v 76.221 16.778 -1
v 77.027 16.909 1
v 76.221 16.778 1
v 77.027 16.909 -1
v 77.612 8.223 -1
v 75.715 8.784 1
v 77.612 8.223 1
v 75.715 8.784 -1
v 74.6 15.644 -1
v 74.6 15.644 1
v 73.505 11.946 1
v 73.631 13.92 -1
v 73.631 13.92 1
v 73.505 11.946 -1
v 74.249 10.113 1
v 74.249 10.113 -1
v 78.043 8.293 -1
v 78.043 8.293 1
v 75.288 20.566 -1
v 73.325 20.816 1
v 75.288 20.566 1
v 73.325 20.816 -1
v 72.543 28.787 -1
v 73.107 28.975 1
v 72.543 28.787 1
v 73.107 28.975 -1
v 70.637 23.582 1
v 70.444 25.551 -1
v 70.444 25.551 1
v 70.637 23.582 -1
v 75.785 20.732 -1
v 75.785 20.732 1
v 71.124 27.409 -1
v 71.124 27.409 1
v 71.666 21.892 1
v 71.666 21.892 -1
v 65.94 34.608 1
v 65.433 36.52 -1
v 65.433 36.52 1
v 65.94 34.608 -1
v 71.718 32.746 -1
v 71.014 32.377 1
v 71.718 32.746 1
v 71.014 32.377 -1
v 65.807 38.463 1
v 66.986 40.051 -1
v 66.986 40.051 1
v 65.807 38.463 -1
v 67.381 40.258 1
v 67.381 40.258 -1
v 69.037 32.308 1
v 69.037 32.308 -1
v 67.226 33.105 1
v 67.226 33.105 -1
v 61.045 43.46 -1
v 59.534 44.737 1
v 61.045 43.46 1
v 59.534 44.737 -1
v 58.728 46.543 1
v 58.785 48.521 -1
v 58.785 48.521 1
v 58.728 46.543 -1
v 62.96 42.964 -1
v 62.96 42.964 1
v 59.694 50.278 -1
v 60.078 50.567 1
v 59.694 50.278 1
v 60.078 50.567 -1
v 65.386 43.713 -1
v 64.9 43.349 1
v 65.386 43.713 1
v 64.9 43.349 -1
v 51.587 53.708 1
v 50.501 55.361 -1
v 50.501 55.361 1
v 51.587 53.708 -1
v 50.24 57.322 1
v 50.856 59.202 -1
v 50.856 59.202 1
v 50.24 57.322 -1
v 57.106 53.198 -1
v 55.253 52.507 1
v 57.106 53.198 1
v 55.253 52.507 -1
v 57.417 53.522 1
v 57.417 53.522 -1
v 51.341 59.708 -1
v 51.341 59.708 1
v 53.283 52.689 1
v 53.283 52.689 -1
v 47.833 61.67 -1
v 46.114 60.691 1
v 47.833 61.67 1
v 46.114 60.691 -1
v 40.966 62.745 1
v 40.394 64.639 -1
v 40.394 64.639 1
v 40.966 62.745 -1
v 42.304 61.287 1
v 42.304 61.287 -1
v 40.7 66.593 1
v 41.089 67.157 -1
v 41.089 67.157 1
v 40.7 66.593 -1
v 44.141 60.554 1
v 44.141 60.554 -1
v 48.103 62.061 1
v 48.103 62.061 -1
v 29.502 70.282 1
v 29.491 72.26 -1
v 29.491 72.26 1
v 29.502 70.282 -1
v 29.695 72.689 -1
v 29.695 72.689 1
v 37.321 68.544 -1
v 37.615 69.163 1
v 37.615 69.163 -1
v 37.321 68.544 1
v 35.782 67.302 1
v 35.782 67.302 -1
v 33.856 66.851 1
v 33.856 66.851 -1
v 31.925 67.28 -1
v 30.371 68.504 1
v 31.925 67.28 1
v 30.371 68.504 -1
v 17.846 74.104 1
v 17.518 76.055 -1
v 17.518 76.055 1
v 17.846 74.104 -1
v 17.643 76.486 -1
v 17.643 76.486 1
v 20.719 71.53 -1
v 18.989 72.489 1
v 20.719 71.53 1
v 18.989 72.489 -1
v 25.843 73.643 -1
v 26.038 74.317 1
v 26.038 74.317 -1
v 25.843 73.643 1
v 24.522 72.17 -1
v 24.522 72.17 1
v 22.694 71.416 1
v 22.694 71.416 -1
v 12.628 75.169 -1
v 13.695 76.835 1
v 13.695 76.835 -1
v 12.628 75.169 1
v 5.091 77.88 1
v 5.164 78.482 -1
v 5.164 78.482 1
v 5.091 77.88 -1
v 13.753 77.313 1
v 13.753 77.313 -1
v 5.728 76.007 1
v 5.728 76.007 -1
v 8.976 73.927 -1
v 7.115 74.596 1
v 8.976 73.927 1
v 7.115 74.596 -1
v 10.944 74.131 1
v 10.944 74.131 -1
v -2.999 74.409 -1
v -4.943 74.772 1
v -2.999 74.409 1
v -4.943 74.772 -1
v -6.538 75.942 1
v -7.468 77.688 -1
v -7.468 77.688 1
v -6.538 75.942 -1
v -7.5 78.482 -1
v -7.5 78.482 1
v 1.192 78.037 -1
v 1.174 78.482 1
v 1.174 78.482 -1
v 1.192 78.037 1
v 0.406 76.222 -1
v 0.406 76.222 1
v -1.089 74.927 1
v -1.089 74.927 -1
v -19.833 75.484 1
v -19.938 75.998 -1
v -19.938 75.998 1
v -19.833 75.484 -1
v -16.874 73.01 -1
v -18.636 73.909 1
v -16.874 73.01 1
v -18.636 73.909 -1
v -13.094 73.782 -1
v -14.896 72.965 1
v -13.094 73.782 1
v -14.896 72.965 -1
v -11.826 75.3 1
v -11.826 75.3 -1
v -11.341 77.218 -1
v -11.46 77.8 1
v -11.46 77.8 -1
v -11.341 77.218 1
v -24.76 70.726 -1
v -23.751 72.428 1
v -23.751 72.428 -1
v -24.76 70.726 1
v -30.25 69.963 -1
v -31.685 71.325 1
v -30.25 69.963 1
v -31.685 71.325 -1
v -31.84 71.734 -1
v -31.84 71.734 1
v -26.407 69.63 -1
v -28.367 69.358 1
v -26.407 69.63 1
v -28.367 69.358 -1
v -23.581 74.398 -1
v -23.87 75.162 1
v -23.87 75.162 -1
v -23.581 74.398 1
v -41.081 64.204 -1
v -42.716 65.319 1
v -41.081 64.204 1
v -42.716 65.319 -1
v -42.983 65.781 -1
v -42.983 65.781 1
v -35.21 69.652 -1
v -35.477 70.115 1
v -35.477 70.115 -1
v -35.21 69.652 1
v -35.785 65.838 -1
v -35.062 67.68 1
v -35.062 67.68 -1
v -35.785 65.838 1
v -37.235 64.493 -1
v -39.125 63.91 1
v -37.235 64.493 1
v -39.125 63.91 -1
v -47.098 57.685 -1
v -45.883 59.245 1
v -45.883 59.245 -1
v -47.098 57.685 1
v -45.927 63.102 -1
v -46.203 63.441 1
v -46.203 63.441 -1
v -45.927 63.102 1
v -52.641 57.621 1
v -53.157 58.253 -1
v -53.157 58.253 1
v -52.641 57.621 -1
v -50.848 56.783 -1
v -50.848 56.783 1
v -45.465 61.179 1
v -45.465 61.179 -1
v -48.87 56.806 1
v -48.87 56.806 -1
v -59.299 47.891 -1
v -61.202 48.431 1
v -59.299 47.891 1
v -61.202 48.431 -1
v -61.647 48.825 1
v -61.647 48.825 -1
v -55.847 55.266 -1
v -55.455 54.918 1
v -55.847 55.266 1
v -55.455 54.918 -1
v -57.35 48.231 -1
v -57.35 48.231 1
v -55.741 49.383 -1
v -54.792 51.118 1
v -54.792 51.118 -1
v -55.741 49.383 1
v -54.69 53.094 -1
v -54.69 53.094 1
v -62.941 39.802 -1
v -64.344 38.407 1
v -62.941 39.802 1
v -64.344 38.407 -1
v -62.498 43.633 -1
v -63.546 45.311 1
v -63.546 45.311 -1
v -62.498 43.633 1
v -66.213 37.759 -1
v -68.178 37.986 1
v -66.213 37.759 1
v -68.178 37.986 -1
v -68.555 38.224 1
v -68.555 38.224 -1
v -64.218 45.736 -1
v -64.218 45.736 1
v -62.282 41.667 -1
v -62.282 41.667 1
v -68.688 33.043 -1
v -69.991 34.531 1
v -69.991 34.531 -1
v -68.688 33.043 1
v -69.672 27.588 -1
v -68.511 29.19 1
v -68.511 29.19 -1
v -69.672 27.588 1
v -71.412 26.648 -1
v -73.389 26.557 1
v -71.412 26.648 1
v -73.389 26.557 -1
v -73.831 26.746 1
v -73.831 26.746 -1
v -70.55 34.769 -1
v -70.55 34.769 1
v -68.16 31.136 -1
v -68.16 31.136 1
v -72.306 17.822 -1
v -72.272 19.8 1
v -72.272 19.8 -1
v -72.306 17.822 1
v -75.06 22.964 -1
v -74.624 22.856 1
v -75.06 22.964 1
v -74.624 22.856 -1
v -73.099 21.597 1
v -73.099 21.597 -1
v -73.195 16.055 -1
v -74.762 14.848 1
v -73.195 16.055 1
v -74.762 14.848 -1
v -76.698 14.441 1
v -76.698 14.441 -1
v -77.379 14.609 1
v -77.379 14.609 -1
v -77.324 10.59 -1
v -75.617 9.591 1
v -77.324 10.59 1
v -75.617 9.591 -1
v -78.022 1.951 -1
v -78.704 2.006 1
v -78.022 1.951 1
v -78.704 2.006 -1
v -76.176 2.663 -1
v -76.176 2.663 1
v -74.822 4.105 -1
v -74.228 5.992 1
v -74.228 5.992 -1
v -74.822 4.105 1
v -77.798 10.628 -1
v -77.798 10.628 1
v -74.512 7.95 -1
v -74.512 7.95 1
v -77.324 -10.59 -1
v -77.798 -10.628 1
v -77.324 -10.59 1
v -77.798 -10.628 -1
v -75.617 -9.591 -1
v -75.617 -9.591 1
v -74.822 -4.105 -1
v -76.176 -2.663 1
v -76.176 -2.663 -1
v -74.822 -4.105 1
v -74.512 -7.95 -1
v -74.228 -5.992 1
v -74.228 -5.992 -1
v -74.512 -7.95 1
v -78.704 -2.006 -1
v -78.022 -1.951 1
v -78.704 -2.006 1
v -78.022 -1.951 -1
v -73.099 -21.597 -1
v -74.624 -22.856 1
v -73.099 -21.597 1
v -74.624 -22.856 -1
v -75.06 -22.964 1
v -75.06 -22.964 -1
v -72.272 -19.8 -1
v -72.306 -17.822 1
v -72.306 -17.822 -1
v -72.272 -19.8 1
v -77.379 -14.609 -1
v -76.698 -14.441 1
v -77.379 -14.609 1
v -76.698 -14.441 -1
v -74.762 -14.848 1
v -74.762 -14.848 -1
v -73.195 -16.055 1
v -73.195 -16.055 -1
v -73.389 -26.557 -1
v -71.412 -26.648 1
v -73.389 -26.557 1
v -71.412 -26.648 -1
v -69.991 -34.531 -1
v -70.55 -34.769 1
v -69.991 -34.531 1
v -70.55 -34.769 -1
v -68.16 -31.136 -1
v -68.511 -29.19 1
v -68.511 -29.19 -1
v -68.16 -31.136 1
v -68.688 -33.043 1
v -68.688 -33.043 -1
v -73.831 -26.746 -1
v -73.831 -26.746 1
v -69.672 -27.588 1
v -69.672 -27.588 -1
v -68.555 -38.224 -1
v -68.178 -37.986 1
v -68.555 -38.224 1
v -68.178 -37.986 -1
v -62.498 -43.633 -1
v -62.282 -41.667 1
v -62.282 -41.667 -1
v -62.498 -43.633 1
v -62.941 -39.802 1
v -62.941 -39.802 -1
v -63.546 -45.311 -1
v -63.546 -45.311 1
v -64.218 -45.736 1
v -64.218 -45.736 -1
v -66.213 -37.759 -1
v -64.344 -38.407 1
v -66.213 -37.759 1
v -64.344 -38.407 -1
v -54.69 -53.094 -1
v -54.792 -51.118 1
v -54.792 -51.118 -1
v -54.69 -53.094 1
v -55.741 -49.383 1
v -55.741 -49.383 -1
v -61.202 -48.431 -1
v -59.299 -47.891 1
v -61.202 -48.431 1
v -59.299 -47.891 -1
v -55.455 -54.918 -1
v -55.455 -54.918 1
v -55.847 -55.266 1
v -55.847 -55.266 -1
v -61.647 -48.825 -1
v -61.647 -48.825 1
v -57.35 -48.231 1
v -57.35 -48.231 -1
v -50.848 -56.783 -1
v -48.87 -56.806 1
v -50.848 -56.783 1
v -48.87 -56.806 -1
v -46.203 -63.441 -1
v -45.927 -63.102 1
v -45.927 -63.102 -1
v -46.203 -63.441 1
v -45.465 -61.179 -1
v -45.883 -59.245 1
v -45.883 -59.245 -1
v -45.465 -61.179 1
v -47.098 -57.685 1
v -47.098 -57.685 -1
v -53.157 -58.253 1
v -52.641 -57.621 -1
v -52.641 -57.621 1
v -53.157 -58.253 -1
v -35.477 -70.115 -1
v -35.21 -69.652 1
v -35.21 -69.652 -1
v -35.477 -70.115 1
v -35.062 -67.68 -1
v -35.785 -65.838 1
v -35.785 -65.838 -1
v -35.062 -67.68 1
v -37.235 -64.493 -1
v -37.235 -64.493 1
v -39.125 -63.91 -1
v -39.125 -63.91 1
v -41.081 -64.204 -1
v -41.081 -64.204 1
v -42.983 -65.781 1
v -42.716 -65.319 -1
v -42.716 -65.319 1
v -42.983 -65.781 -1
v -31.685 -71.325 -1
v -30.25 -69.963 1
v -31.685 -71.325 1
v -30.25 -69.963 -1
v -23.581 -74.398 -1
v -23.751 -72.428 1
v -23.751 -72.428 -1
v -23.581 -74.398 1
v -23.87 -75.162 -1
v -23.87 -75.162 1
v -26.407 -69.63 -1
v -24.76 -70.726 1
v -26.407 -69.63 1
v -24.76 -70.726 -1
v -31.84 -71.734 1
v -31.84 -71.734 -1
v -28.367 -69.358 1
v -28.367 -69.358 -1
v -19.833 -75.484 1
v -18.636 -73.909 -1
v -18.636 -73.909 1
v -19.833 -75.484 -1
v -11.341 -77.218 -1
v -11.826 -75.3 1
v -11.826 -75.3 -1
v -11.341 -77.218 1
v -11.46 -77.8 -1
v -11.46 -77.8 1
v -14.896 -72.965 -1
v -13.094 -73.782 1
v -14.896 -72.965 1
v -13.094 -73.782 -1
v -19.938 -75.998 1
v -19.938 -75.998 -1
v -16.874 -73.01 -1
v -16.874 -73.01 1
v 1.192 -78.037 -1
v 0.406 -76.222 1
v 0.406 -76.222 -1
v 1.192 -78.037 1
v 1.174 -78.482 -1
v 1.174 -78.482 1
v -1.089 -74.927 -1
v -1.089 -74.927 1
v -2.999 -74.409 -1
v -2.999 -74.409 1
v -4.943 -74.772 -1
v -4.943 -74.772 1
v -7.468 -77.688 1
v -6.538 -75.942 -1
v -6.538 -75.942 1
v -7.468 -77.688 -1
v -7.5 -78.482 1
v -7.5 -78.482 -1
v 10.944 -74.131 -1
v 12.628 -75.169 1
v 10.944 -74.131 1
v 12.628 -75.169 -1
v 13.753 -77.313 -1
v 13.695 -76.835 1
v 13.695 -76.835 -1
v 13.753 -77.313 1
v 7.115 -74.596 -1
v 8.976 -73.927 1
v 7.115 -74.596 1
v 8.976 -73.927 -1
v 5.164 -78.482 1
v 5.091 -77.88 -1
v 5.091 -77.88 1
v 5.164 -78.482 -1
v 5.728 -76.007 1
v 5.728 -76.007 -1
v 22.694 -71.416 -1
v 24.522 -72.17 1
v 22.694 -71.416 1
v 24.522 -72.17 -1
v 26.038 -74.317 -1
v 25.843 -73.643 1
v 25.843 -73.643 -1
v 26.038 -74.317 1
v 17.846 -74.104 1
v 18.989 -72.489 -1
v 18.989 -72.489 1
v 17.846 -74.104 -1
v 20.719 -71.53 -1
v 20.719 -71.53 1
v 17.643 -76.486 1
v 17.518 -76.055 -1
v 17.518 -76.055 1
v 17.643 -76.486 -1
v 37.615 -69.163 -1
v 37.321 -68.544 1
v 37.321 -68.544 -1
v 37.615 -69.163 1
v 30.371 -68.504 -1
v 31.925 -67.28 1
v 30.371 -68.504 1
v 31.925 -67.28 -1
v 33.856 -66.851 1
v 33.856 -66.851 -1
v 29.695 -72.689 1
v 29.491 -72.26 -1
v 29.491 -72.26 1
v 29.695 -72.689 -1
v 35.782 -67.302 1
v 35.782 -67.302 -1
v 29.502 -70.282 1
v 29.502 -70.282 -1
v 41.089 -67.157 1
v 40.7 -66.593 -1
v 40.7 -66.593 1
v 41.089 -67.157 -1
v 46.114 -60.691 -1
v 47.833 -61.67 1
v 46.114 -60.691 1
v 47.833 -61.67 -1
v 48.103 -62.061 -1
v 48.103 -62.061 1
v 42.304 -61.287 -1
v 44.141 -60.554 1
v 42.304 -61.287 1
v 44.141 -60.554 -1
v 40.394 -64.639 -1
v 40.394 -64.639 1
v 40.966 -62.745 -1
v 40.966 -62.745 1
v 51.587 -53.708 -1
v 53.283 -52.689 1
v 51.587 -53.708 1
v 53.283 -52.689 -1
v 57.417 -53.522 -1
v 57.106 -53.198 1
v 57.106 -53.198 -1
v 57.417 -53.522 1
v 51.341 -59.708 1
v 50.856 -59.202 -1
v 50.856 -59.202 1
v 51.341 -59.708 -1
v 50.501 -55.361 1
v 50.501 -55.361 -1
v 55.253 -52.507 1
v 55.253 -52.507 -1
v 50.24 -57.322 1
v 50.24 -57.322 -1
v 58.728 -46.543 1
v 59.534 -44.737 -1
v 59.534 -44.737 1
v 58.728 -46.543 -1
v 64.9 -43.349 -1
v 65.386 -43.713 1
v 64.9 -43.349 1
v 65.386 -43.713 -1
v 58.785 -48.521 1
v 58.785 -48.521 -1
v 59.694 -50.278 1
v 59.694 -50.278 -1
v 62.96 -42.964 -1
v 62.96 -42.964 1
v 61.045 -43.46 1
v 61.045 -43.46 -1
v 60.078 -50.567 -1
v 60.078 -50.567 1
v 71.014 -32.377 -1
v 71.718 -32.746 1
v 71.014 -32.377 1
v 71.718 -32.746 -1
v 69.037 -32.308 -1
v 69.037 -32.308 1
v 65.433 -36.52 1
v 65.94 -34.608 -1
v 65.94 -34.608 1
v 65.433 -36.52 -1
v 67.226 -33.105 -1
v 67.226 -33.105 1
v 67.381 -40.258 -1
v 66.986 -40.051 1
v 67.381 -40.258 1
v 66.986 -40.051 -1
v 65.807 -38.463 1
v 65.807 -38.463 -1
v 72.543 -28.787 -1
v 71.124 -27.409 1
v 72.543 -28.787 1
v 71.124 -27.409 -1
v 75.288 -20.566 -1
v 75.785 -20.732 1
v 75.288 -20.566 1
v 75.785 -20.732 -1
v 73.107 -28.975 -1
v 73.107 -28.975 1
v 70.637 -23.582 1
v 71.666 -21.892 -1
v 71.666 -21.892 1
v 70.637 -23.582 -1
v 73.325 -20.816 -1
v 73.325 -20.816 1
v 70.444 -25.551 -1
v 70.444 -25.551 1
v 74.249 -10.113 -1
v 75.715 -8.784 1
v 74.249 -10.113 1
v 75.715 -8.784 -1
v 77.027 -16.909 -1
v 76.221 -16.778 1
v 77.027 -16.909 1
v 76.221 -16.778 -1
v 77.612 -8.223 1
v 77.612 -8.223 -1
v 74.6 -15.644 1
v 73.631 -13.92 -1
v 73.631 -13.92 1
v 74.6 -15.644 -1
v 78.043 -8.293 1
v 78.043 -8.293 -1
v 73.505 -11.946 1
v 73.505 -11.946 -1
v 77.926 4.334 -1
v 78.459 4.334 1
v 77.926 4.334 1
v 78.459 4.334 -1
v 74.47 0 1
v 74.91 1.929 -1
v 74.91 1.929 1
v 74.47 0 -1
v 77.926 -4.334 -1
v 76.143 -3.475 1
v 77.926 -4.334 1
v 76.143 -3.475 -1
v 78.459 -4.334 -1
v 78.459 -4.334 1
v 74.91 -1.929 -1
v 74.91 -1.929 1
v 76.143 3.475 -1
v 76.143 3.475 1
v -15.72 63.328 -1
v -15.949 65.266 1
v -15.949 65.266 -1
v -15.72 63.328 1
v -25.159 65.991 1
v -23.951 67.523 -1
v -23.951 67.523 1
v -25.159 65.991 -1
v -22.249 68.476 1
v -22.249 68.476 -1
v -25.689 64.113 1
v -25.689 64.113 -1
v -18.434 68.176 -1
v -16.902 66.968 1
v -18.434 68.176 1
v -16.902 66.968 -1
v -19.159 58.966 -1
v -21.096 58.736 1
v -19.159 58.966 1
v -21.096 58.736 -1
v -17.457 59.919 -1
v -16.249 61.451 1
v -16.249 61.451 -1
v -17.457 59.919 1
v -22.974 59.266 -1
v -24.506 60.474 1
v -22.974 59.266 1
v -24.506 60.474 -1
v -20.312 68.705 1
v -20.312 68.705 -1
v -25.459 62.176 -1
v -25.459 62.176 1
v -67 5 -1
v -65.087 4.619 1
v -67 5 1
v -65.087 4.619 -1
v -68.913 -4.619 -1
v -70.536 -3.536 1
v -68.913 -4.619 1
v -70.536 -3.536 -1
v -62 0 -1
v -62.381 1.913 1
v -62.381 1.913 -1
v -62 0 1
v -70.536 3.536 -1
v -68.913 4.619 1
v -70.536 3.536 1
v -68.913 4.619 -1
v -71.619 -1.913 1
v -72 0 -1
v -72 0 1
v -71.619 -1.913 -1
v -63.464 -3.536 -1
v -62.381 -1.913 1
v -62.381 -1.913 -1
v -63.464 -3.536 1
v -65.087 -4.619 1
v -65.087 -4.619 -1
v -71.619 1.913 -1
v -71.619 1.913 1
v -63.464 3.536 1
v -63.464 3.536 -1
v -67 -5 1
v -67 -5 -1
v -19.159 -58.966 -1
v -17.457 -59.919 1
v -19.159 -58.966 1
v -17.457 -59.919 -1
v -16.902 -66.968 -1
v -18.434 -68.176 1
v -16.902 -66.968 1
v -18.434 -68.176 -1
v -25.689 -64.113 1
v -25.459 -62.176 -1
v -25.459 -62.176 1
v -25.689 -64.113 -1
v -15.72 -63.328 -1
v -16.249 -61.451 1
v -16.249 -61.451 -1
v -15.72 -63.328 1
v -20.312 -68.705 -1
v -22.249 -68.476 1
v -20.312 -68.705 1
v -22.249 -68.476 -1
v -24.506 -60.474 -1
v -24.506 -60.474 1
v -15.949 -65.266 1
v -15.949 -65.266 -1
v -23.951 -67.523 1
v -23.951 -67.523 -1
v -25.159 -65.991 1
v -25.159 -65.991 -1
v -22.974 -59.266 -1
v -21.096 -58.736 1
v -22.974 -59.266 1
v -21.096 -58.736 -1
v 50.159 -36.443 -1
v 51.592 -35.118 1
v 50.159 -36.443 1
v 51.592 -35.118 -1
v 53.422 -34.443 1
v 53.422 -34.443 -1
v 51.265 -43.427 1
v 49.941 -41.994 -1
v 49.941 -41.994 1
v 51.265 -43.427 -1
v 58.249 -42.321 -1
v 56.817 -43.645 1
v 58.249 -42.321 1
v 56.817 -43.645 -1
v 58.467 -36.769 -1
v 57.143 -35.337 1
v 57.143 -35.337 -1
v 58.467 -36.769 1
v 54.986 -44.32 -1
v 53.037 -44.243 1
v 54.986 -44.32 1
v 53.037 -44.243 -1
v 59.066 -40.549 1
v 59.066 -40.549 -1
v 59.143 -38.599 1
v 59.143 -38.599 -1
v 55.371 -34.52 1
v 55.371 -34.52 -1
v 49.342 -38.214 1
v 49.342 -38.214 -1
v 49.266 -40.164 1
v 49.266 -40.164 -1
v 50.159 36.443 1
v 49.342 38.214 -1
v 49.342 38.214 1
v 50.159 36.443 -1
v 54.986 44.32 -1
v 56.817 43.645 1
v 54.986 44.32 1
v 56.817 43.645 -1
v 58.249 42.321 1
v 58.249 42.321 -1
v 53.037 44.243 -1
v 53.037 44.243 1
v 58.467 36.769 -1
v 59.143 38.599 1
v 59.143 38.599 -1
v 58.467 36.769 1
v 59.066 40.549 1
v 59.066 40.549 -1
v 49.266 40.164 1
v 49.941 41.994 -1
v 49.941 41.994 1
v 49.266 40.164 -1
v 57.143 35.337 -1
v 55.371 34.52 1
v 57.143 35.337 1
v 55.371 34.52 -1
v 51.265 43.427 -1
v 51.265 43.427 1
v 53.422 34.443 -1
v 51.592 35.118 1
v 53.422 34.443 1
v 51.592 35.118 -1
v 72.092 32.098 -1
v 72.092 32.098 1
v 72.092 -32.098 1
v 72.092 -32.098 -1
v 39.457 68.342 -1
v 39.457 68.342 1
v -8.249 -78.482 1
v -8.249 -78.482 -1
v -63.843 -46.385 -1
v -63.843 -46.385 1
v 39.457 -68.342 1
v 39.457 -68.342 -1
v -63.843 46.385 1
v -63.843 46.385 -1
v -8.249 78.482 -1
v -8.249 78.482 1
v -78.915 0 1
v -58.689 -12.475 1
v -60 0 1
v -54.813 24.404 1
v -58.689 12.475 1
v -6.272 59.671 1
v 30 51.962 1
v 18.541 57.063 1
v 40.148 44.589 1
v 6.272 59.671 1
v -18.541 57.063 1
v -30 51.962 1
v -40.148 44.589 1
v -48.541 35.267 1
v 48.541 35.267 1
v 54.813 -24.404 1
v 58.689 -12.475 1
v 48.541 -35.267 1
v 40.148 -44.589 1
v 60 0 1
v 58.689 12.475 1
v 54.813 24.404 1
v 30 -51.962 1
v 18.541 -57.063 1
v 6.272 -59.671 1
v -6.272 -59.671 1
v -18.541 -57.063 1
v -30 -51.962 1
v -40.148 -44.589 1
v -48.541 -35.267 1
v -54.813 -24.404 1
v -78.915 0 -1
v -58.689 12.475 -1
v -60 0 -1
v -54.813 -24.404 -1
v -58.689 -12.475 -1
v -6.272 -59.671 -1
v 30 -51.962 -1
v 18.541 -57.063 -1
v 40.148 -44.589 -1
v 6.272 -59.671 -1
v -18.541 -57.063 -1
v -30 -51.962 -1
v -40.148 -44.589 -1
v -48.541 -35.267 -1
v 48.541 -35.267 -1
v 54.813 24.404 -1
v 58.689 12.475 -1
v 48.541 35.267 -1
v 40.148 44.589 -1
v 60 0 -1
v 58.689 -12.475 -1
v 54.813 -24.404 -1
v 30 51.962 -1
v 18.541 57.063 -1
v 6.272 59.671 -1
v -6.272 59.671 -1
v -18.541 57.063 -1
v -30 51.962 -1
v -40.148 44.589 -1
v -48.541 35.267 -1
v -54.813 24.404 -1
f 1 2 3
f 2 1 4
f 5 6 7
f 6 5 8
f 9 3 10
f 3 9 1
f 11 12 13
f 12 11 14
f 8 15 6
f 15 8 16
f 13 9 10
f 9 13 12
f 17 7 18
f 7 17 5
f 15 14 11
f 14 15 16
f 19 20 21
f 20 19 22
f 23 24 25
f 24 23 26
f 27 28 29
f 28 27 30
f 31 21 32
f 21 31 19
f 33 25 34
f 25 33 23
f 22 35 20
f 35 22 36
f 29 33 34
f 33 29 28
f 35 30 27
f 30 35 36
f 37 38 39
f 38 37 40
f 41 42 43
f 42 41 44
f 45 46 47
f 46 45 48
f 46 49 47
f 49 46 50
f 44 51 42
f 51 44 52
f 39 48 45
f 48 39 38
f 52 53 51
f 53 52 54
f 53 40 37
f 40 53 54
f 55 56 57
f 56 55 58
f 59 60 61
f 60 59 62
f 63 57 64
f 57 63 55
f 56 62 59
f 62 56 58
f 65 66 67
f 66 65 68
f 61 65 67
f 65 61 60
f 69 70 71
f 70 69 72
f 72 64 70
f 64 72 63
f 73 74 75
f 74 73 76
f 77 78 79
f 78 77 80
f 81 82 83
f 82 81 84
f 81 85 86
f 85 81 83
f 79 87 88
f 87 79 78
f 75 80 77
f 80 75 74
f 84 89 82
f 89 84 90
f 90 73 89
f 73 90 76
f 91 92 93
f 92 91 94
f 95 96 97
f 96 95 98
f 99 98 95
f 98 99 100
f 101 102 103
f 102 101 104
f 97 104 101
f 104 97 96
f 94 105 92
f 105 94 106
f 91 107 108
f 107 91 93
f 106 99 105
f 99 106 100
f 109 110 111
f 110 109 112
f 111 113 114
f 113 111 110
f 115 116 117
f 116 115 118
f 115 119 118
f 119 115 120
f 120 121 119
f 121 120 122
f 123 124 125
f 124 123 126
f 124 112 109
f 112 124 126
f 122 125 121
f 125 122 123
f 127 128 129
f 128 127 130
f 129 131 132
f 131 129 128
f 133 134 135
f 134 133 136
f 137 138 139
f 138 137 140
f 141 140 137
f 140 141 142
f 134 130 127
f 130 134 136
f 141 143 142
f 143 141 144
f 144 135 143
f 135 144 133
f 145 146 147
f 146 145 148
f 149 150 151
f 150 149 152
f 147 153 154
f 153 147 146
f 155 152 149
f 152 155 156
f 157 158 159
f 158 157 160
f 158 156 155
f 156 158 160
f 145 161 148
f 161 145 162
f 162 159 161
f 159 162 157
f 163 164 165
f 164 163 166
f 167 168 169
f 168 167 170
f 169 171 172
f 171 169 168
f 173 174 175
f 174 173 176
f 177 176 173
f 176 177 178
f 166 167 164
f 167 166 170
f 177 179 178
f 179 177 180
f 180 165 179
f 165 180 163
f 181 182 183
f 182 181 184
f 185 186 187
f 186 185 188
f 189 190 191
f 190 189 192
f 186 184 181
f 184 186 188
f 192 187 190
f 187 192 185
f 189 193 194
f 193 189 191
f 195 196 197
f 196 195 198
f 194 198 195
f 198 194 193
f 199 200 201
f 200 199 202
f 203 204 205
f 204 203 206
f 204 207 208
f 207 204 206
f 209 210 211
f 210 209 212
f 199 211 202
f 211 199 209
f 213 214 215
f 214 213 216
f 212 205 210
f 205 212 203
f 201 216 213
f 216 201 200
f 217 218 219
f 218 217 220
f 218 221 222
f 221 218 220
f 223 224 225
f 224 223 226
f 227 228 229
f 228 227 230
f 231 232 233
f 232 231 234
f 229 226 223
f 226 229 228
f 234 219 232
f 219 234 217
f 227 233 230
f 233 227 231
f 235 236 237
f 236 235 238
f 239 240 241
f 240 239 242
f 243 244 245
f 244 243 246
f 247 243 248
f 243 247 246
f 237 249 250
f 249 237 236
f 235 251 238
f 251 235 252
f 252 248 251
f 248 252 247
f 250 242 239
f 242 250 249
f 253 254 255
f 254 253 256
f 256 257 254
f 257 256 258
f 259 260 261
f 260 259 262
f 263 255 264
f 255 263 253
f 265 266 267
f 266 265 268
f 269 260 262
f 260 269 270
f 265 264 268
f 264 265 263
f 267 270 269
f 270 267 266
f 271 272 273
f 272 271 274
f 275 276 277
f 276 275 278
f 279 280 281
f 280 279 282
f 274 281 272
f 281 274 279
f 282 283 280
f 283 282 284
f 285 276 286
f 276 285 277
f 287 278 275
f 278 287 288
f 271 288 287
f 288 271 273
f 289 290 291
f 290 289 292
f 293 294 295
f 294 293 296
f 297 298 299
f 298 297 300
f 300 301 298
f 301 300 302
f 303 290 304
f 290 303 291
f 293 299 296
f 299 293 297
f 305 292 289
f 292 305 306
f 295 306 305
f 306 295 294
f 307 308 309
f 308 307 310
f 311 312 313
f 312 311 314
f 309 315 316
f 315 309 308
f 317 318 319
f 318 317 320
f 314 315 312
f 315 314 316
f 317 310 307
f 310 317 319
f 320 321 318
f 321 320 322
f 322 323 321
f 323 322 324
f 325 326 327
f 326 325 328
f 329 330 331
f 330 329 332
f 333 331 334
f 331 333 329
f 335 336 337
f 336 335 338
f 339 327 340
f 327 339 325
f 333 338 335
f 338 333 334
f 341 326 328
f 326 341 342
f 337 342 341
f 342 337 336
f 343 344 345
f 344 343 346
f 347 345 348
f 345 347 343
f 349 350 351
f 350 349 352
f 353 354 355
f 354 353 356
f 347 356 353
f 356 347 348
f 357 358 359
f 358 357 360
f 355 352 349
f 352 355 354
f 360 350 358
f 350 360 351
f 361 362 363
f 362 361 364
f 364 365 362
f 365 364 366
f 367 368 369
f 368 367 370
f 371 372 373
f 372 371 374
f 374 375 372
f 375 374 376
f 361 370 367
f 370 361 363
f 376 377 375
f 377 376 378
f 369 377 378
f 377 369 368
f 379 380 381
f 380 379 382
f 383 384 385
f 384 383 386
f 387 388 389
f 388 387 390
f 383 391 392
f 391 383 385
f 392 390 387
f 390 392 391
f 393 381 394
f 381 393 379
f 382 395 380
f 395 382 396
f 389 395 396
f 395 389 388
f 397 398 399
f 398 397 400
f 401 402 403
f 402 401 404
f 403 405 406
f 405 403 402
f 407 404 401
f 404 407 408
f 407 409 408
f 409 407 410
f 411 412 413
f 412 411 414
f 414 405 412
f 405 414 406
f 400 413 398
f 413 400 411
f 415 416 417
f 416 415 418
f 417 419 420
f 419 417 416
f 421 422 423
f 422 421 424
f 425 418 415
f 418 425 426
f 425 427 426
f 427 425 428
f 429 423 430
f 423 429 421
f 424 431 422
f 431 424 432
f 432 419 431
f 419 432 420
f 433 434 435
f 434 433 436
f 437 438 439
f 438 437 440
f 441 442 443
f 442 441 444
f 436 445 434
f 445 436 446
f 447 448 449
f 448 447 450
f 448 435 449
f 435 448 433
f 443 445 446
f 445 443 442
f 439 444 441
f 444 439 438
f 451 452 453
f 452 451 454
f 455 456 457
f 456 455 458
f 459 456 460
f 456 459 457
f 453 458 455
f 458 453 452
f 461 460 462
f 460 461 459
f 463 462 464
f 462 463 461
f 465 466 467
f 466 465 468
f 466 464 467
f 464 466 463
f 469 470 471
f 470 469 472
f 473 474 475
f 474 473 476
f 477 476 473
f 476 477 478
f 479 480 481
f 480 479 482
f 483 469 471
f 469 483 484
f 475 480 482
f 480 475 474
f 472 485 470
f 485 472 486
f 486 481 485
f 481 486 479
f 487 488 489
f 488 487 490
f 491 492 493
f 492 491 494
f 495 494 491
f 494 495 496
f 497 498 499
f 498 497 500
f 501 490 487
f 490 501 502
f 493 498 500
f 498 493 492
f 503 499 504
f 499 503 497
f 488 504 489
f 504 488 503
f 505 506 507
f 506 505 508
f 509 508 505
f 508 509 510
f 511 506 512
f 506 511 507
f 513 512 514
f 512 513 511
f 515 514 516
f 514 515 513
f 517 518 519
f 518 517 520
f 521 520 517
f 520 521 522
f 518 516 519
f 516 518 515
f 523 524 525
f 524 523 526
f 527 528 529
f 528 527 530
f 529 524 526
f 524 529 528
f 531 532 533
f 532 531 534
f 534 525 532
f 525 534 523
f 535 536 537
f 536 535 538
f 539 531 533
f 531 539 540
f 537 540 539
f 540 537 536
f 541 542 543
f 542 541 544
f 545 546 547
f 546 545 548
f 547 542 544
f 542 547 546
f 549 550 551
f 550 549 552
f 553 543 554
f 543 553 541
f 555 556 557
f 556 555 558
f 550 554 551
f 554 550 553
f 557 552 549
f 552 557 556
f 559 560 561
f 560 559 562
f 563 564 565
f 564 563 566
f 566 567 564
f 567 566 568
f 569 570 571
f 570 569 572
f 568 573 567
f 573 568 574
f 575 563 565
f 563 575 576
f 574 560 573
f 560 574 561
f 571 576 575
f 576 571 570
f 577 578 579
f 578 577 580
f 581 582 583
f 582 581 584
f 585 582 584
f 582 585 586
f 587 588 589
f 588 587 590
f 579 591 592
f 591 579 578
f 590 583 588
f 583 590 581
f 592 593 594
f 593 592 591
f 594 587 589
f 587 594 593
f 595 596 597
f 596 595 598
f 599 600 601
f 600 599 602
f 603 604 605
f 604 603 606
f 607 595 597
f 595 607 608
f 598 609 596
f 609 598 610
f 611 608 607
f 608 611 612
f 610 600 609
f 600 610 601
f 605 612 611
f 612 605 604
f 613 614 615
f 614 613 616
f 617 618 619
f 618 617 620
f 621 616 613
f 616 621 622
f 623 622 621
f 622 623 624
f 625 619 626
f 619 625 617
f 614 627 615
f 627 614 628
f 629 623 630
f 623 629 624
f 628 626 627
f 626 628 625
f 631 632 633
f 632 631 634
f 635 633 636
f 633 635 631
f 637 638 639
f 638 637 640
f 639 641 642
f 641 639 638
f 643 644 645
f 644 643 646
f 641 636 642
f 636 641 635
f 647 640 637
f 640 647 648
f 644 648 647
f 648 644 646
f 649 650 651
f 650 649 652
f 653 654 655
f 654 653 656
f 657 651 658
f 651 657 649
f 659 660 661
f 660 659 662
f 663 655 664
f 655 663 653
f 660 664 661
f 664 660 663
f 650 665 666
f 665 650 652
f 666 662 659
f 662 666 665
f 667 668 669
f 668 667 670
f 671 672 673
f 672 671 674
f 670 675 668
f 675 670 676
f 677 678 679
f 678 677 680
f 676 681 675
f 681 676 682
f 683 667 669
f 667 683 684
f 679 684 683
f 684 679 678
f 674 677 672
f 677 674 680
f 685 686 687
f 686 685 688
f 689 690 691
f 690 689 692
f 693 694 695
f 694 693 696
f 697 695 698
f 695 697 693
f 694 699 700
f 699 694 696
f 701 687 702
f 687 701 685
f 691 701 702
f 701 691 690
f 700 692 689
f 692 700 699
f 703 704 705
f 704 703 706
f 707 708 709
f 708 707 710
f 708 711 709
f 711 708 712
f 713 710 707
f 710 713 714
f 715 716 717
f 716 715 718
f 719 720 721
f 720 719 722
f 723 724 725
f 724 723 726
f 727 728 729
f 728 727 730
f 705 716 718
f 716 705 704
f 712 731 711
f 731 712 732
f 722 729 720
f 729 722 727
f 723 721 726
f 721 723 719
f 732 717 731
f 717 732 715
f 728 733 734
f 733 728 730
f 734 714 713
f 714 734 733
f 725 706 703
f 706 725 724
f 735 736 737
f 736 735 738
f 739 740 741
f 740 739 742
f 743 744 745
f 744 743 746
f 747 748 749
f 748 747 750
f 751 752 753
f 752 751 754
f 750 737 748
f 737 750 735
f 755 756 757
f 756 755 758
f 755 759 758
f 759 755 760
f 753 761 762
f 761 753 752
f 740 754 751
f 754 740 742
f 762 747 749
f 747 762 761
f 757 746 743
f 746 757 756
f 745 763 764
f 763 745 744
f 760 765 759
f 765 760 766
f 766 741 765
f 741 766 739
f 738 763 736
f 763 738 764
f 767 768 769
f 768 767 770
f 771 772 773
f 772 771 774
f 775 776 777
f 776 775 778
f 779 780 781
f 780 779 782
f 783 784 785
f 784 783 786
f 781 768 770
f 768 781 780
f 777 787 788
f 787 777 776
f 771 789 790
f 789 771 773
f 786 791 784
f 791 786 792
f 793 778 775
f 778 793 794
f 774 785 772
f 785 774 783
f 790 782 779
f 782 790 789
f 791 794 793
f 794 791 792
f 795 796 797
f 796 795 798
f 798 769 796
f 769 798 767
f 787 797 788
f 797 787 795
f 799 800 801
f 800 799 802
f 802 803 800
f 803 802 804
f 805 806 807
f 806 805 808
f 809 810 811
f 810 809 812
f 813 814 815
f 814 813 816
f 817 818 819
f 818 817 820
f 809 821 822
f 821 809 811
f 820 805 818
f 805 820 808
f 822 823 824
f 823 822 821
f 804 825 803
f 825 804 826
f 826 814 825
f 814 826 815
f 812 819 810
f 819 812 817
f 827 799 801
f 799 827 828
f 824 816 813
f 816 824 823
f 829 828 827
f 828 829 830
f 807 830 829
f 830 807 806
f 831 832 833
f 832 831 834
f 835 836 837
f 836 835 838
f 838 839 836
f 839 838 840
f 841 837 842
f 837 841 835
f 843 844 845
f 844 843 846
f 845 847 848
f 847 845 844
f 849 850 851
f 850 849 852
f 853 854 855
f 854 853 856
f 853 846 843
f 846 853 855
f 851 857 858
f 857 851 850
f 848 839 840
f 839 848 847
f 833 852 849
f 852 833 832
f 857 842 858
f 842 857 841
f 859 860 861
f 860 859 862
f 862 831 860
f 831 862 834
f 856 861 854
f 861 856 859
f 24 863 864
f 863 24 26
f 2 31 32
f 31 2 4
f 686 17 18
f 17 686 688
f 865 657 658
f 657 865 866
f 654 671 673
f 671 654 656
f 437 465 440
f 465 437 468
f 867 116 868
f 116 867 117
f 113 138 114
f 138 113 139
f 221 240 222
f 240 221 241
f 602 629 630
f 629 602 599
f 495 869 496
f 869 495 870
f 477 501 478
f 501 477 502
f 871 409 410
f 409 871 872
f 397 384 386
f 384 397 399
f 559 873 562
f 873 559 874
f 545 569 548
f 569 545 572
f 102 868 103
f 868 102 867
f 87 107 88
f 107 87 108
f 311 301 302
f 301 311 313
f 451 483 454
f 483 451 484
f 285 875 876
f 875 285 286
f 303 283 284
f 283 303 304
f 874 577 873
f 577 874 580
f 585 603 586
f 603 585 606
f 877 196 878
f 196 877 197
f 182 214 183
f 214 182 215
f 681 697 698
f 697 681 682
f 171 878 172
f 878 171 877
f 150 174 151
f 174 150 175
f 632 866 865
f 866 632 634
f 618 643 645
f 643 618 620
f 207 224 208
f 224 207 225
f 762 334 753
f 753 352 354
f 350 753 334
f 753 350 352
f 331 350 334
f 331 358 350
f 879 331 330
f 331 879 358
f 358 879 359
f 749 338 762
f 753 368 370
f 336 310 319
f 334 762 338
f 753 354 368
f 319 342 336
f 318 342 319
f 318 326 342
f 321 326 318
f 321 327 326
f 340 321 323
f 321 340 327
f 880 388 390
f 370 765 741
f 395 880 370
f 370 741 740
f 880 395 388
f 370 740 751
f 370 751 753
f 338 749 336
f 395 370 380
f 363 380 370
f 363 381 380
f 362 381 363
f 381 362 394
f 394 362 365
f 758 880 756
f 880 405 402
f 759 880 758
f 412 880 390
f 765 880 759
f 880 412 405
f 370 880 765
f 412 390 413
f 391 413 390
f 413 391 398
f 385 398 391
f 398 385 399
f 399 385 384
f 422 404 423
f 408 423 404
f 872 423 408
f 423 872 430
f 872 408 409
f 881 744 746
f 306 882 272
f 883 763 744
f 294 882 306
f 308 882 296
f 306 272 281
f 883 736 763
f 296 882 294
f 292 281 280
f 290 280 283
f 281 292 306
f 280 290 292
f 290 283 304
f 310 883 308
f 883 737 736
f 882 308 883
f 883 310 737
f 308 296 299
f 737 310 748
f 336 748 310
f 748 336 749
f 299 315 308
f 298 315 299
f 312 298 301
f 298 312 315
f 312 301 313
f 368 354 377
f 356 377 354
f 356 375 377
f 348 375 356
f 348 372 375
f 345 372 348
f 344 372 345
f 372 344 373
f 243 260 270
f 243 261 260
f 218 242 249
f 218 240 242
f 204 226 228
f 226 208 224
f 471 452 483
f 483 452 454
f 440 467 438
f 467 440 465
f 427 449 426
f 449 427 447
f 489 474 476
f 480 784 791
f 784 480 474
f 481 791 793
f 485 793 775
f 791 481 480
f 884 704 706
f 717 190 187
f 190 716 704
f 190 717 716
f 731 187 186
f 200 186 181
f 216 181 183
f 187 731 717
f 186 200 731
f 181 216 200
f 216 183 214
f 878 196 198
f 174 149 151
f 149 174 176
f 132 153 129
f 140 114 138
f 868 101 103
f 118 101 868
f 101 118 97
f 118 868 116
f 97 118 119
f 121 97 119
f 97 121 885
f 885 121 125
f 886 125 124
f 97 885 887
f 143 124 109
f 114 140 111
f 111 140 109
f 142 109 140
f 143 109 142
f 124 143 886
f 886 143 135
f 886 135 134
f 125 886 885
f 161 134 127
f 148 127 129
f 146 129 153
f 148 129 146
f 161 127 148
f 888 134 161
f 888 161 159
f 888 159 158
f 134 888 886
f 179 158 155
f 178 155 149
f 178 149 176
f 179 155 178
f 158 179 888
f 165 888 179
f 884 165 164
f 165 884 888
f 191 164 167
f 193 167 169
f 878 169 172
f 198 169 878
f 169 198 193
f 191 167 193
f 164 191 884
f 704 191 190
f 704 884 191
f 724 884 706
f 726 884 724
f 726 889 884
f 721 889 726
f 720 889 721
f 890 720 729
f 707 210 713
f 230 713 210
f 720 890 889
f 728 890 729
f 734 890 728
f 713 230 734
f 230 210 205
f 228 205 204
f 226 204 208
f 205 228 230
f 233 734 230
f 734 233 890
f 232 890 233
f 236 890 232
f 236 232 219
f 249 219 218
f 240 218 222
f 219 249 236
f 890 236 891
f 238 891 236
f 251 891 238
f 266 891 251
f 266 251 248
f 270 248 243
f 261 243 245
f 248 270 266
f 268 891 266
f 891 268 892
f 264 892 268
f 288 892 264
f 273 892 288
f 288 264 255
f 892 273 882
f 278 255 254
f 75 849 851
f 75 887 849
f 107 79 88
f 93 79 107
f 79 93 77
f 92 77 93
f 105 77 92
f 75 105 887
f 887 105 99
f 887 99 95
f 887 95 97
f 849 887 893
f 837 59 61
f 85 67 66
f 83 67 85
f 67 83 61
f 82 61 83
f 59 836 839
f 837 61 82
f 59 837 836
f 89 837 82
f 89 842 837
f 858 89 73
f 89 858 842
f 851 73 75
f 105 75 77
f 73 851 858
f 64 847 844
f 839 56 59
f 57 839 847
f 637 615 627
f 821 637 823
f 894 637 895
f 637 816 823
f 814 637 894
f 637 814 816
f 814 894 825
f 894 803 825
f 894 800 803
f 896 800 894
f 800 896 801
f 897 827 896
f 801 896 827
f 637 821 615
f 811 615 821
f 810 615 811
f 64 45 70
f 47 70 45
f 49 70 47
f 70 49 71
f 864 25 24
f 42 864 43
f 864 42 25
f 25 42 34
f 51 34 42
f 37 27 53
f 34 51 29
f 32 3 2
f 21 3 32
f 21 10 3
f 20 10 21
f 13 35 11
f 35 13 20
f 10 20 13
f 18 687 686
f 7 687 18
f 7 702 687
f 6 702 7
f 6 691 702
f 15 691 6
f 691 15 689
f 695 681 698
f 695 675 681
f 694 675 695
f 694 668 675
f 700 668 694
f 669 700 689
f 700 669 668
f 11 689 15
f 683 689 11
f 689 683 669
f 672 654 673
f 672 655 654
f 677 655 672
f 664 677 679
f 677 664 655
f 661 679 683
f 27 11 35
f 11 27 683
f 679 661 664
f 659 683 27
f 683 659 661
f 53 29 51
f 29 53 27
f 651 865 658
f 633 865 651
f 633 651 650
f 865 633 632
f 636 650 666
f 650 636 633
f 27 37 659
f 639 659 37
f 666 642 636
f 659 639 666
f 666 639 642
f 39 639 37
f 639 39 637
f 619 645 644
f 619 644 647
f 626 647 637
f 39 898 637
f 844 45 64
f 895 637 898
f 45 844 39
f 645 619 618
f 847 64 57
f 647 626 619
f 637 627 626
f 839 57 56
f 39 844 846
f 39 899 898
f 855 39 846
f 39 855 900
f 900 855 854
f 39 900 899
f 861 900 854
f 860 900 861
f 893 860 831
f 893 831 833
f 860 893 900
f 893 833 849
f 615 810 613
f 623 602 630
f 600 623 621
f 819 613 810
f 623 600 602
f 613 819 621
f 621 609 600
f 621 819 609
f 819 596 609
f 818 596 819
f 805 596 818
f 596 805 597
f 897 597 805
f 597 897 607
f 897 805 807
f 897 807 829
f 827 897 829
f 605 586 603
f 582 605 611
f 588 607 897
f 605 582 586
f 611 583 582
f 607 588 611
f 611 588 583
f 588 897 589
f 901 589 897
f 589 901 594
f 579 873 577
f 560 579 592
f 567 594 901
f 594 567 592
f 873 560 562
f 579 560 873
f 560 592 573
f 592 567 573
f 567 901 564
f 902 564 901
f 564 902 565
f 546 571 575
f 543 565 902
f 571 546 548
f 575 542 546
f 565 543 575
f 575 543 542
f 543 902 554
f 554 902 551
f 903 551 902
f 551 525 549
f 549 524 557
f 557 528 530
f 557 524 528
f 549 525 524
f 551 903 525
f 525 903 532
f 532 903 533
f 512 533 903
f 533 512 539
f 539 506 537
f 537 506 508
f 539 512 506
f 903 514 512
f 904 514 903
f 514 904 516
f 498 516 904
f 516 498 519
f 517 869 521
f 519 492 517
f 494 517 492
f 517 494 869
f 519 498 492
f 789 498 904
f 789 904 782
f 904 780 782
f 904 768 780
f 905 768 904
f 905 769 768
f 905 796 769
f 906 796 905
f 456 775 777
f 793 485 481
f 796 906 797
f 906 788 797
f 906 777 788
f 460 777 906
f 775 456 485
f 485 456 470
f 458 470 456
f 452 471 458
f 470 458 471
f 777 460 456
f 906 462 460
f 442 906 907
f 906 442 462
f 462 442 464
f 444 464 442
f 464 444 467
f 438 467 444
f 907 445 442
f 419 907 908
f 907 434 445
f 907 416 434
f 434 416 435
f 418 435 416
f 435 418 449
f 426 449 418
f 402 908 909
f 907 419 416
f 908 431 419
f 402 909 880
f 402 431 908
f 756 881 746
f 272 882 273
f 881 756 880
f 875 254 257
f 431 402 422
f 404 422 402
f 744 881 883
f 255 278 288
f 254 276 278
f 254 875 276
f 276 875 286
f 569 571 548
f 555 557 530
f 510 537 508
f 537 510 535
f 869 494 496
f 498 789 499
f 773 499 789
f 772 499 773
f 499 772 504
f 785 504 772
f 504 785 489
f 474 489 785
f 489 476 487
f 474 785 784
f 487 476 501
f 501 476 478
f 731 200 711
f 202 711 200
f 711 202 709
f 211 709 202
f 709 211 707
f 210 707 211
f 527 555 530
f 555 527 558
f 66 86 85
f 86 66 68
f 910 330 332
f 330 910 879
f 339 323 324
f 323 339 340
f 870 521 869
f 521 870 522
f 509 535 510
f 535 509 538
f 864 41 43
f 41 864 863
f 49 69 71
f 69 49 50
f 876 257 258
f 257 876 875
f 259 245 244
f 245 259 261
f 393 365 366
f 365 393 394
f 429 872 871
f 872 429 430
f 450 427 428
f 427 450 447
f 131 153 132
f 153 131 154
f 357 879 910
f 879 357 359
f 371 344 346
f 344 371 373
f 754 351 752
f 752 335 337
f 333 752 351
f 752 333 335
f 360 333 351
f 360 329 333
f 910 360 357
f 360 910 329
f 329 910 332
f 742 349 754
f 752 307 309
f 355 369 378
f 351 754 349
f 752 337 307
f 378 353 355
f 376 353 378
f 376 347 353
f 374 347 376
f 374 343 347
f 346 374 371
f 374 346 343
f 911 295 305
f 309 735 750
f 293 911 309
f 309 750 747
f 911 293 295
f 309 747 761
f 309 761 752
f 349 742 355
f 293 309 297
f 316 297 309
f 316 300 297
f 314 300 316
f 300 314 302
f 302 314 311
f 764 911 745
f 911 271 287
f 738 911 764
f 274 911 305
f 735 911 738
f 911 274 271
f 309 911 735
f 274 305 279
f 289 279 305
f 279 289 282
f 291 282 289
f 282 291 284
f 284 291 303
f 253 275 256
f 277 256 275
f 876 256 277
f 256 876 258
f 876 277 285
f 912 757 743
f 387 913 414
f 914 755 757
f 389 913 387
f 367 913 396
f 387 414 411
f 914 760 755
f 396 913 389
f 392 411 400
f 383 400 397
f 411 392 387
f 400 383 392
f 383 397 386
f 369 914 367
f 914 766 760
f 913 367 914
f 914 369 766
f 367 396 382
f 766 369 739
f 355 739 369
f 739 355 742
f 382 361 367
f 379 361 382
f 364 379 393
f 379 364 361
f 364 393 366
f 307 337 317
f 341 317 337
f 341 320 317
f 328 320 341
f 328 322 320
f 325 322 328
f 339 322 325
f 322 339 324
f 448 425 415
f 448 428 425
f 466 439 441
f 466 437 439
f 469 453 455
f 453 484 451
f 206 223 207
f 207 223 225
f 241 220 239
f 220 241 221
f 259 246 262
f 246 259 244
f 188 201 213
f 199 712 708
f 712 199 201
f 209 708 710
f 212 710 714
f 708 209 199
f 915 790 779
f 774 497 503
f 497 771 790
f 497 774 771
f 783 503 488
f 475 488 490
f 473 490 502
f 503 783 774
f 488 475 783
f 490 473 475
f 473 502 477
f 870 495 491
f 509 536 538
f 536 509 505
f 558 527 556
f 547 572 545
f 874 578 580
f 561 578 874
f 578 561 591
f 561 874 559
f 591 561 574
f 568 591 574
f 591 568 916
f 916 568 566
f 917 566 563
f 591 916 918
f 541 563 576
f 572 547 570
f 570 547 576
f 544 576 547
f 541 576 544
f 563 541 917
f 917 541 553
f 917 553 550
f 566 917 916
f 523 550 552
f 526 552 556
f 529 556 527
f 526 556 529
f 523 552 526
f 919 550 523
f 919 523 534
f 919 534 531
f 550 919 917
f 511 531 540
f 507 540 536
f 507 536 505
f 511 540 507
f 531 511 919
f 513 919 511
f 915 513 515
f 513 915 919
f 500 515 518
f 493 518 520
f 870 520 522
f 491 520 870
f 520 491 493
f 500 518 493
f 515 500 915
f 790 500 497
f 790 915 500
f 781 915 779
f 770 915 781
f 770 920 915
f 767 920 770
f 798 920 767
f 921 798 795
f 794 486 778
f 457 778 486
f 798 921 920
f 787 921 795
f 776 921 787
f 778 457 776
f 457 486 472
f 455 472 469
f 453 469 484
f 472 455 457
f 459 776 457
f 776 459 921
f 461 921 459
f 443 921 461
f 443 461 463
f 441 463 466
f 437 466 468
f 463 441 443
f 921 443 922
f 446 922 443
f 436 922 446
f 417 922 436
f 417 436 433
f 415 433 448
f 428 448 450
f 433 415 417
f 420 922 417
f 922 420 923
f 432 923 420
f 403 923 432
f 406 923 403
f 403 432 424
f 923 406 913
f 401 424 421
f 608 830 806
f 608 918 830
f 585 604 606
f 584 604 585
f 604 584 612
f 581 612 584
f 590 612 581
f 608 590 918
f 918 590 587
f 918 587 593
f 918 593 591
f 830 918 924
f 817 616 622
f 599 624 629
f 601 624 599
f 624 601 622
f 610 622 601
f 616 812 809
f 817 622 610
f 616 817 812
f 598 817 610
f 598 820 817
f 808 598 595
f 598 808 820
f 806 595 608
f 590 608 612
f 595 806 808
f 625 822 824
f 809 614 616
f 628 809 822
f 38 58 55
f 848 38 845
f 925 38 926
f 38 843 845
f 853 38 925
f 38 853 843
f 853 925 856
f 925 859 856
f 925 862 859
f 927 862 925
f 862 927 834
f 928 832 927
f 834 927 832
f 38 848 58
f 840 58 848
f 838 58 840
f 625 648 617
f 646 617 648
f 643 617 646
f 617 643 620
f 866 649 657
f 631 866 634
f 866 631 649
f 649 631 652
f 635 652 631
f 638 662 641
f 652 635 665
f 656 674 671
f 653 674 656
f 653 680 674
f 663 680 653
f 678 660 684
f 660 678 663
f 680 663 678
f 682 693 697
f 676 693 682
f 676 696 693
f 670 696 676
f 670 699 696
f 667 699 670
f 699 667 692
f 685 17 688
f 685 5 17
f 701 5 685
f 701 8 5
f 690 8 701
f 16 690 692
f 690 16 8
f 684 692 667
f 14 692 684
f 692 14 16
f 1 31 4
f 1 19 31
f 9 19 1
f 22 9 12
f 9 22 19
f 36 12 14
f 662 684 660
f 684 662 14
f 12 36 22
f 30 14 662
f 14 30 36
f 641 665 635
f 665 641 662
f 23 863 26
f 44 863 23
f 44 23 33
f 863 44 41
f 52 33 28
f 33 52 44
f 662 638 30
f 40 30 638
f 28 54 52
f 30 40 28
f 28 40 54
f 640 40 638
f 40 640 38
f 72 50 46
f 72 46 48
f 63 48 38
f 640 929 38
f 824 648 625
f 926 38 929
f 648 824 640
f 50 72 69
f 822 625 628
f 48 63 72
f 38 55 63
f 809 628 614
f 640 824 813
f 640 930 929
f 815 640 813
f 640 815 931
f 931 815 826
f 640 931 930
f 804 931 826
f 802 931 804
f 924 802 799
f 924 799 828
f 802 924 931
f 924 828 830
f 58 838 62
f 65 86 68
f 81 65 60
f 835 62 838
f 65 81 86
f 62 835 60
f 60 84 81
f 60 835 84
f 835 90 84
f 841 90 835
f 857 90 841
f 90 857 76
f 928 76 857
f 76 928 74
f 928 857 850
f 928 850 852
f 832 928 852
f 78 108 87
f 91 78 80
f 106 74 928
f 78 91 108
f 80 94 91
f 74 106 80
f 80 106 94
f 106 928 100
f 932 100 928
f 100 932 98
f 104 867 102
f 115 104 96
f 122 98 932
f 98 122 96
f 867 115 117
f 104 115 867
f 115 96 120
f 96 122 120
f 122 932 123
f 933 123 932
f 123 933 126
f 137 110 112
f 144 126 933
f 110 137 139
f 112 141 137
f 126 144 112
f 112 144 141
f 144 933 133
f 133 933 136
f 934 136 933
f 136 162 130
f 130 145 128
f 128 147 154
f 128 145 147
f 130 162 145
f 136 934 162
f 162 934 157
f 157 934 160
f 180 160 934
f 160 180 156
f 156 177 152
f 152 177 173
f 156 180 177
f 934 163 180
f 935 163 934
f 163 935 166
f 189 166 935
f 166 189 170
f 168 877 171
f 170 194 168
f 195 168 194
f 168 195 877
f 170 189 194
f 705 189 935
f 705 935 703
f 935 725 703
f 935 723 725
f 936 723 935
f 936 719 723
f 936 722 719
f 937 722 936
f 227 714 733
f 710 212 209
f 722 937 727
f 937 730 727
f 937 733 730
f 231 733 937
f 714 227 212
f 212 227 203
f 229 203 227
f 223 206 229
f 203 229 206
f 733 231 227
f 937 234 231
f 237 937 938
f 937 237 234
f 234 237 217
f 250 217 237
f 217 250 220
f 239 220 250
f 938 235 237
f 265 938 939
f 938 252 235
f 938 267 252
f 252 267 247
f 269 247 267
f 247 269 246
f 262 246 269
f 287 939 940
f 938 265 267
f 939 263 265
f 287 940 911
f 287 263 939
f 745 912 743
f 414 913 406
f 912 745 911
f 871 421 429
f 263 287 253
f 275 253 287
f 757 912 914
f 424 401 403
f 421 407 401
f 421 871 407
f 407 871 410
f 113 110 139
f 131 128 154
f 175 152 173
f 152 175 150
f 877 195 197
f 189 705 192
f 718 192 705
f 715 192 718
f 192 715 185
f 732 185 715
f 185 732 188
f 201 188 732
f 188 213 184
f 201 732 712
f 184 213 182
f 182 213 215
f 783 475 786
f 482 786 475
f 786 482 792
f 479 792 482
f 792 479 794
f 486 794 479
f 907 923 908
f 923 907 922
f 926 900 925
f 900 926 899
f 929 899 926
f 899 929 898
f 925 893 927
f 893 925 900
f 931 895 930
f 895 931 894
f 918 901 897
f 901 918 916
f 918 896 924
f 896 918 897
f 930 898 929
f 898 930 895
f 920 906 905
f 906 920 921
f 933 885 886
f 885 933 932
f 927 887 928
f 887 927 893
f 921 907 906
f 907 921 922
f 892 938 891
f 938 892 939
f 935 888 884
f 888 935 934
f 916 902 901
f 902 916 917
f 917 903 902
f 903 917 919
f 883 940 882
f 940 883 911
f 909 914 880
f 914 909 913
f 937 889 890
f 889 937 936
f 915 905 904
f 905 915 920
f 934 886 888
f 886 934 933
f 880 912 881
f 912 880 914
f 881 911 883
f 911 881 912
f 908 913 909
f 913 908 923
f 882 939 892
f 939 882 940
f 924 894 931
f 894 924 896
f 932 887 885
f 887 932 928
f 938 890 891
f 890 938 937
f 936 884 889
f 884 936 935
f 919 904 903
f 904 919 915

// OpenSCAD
// file: drive_sprocket.scad
//use <Wheel.scad>
//use <thread.scad>
//use <chain.scad>

/*
P = 1/2 * inch # pitch
Dr = 5/16 * inch # max roller diameter
N = 9 # number of teeth
*/
tolerance = .032 * 2;

inch = 25.4;
//Dr = .312 * inch; // roller diameter
Dr = .35 * inch; // roller diameter
P = 0.5 * inch;   // chain pitch

N = 12;            // number of cogs
T = 2;            // thickness of cog // sram 11 speed

function pitch_radius(P, N) = P / (2 *sin(180/N)); // Pitch radius (using regular n-gon geometry)

module triangle(r, t, theta){
  linear_extrude(height=t)polygon([[0, 0],
				   r * [cos(theta/2), -sin(theta/2)],
				   r * [cos(theta/2),  sin(theta/2)]]);
}

module tooth(N, P, Dr, T){
  theta = 360 / N; // DEG
  //Rp = P / (2 *sin(theta/2)); // Pitch radius (using regular n-gon geometry)
  Rp = pitch_radius(P, N);
  v = P;                   // velocity of chain (mm/sec)
  w = 360/N; // degrees per second
  Rcog = Rp + Dr/3;
    intersection(){
      translate([0, 0, -T/2])triangle(2 * Rp, T, theta);
      translate([0, 0, -T/2])
    difference(){
	cylinder(r=Rcog, h=T);
      for(t=[-1.125:0.125:1.125]){
	rotate([0, 0, w * t])
	  for(i=[-0:0]){
	    translate([Rp, i * P - t * v, -1])
	      cylinder(d=Dr, h=T+2, $fn=30);
	  }
      }
    }
  }
}

module cog(N, P, Dr, T, taper=.25){
  Ttaper = T * taper;
  middle_width = T * (1 - 2 * taper);

  theta = 360 / N; // DEG
  Rp = pitch_radius(P, N);
  Rcog = Rp + Dr/3;
  intersection(){
    union(){
      for(i=[1:N]){
	rotate([0, 0, i * theta])tooth(N, P, Dr, T);
      }
    }
    union(){
      translate([0, 0, middle_width/2])cylinder(r2=Rp, r1=Rcog, h=Ttaper);
      translate([0, 0, -middle_width/2])cylinder(r=Rcog, h=middle_width);
      translate([0, 0, -Ttaper-middle_width/2])cylinder(r1=Rp, r2=Rcog, h=Ttaper);
    }
  }
    
}
module dShaft(D, d, h){
  difference(){
    translate([0, 0, 0])cylinder(d=D + tolerance, h=h, $fn=100);
    translate([-D/2 + d + tolerance, -(h+2)/2, -1])cube(h+2);
  }
}


dtheta = 3;
dz = 3.5;

N = 53;
difference(){
  color([.3, .3, .3])translate([0, 0, 0])cog(N, P, Dr, 3*T/4, taper=.25);
  translate([0, 0, -10])cylinder(r=100, h=20);
}
// main file
use<drive_sprocket.scad>
inch = 25.4;
N = 39;

Dr = .35 * inch; // roller diameter
P = 0.5 * inch;   // chain pitch
R = pitch_radius(P, N);
T = 2;

theta = 360 / N;
difference(){
  cylinder(r=R, h=T, center=true);
  cylinder(r=60, h=T + 2, center=true);
  //cylinder(d=10, h=T + 2, center=true);
  for(i=[1:N]){
    rotate([0, 0, theta * i])
      translate([R, 0, 0])
      cylinder(d=Dr, h=T + 2, center=true);
  }
  /*
  for(i=[1:5]){
    rotate([0, 0, i * 72])
      translate([60, 0, 0])cylinder(d=60, h=T+2, center=true);
      }
  */
  for(i=[1:5]){
    rotate([0, 0, i * 72 + 36])
      translate([67, 0, 0])cylinder(d=10, h=T+2, center=true);
  }
}
